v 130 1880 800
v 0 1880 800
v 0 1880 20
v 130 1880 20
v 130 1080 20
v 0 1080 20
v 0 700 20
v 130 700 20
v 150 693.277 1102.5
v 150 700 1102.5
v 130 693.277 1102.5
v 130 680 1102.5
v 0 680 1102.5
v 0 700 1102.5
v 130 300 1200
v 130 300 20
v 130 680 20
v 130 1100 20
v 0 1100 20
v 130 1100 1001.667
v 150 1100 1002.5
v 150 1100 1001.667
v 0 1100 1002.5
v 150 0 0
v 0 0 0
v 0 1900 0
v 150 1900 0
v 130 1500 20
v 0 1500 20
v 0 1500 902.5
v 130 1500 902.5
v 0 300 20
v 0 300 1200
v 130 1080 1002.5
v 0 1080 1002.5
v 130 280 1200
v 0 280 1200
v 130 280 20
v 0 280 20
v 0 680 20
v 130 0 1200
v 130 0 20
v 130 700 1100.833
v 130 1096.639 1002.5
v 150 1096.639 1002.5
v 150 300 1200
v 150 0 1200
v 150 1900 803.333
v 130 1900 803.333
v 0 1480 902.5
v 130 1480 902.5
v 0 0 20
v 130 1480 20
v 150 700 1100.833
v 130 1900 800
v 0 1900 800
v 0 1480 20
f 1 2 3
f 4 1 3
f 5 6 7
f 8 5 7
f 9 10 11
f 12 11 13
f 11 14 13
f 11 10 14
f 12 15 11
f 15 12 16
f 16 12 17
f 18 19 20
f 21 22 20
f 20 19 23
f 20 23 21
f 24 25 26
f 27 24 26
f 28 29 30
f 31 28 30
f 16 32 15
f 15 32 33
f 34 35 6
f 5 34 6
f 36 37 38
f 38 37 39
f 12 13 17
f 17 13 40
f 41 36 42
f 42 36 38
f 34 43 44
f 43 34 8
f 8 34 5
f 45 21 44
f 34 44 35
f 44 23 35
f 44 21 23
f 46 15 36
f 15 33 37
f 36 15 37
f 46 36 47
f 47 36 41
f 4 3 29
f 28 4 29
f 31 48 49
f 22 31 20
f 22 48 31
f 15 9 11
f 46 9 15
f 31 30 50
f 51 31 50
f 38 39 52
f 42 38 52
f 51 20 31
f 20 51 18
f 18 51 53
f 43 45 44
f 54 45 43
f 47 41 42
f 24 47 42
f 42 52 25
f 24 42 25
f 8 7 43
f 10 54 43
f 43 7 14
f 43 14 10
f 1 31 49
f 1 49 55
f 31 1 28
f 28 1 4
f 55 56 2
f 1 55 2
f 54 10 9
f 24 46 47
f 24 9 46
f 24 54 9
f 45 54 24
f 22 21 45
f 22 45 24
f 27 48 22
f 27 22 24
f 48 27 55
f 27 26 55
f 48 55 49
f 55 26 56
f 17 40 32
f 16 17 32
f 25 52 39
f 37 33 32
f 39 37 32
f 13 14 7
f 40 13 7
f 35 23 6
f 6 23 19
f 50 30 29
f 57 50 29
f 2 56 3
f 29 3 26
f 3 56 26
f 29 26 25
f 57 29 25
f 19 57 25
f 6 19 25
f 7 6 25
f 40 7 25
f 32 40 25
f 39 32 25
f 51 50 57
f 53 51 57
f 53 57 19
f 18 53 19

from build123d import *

# Parameters (mm, degrees)
BOSS_EXTRUDE4_DEPTH = 150
BOSS_EXTRUDE5_START = -150
BOSS_EXTRUDE5_DEPTH = 20


with BuildPart() as part:
    # Sketch1 → Boss-Extrude4 (new body)
    with BuildSketch(Plane(origin=(0, 0, 0), x_dir=(0, 0, -1), z_dir=(1, 0, 0))):
        Polygon((-20, 0), (0, 0), (0, 1900), (-800, 1900), (-800, 1880), (-20, 1880), (-20, 1500), (-902.5, 1500), (-902.5, 1480), (-20, 1480), (-20, 1100), (-1002.5, 1100), (-1002.5, 1080), (-20, 1080), (-20, 700), (-1102.5, 700), (-1102.5, 680), (-20, 680), (-20, 300), (-1200, 300), (-1200, 280), (-20, 280), align=None)
    extrude(amount=BOSS_EXTRUDE4_DEPTH)

    # Sketch2 → Boss-Extrude5 (add)
    with BuildSketch(Plane.ZY.offset(BOSS_EXTRUDE5_START)):
        Polygon((0, 1900), (803.333333333, 1900), (1200, 300), (1200, 0), (0, 0), align=None)
    extrude(amount=BOSS_EXTRUDE5_DEPTH)


solid = part.part
